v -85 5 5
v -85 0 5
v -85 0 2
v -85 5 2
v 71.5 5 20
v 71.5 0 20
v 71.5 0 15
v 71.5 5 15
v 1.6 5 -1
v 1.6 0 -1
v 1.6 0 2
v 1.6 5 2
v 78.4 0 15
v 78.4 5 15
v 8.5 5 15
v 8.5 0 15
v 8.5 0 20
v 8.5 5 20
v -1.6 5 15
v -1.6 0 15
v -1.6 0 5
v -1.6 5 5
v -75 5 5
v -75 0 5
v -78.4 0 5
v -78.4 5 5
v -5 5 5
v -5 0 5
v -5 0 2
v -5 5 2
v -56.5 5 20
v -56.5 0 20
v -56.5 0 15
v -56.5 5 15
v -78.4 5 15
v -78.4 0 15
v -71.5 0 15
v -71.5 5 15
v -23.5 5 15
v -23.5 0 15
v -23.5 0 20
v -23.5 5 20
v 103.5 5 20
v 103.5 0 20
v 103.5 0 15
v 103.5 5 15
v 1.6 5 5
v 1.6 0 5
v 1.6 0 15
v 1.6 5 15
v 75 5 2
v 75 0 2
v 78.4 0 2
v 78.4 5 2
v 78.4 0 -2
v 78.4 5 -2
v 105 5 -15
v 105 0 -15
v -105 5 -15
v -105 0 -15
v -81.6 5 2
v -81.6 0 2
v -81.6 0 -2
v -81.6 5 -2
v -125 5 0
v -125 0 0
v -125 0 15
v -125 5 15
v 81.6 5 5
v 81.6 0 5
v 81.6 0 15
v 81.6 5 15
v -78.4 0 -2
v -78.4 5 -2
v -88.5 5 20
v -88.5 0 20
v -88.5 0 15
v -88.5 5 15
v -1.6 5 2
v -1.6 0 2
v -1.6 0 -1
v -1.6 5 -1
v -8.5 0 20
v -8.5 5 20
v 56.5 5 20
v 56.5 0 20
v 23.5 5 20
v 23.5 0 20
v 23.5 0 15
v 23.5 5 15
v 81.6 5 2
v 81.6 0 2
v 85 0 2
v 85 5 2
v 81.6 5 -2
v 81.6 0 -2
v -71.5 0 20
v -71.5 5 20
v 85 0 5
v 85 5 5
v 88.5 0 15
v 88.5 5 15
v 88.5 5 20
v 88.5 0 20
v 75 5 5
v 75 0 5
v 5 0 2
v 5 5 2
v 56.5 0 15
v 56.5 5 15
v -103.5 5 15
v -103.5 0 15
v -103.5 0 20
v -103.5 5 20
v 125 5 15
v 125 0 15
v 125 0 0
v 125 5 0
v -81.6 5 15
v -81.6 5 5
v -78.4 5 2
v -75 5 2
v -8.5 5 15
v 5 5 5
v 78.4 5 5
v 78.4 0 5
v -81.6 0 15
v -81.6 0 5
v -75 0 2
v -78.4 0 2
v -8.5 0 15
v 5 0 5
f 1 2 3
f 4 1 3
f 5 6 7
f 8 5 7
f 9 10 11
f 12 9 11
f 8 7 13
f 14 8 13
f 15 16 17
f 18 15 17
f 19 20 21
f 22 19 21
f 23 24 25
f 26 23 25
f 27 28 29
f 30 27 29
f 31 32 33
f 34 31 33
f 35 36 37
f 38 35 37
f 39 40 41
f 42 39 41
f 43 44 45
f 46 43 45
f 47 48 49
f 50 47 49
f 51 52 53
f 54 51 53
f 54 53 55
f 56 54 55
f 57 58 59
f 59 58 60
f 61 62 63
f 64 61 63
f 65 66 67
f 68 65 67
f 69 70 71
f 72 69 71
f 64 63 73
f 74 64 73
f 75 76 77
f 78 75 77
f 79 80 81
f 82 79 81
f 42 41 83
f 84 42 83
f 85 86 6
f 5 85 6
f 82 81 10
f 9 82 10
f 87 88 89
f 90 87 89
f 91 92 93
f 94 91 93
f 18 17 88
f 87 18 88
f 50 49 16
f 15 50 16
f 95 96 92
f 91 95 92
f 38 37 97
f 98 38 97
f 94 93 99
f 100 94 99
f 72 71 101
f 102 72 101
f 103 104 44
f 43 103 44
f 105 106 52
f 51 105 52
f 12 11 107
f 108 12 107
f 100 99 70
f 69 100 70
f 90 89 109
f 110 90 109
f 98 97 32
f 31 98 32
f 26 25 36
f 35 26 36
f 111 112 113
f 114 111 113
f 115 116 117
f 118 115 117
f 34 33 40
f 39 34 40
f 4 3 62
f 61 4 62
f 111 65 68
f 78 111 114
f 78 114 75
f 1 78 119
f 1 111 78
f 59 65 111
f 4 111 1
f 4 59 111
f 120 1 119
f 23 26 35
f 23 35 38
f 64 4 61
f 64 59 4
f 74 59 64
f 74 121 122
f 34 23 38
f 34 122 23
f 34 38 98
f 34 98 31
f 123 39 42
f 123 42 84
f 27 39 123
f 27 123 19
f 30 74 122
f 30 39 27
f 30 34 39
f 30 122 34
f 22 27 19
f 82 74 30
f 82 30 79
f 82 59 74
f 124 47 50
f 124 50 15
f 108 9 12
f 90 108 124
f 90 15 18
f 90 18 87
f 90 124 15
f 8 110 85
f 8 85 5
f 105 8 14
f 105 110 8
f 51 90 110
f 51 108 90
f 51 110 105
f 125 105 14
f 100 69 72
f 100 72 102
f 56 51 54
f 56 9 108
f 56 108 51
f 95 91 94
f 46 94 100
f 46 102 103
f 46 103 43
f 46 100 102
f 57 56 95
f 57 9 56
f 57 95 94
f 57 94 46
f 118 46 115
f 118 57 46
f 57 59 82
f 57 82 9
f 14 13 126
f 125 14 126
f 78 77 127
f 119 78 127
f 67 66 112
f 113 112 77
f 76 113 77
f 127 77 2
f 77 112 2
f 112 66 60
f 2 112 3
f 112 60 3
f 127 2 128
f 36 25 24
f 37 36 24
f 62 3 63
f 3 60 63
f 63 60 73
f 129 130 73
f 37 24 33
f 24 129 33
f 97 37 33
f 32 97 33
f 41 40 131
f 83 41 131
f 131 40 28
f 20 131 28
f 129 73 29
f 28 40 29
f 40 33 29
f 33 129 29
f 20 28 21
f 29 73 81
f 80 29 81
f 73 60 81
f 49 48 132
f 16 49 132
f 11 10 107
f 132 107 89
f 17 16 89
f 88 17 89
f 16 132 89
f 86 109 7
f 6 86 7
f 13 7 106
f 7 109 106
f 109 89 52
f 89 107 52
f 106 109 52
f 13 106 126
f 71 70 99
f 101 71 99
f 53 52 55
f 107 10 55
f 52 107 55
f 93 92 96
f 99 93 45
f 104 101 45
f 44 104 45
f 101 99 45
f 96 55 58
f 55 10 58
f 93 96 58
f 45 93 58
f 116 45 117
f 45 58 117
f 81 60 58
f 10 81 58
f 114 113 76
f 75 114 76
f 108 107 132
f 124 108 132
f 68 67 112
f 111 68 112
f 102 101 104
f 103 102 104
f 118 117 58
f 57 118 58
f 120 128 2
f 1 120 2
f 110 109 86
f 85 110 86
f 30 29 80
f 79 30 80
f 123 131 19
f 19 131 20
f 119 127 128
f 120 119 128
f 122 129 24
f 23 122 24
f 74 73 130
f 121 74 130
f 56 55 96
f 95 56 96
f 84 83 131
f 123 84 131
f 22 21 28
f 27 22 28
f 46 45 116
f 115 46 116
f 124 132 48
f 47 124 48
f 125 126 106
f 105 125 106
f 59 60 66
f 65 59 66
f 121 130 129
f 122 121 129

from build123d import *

# Parameters (mm, degrees)
EXTRUDE_1_DEPTH = 5


with BuildPart() as part:
    # 草圖1 → 填料-伸長1 (new body)
    with BuildSketch(Plane(origin=(0, 0, 0), x_dir=(1, 0, 0), z_dir=(0, 1, 0))):
        Polygon((-125, -15), (-103.5, -15), (-103.5, -20), (-88.5, -20), (-88.5, -15), (-81.6, -15), (-81.6, -5), (-85, -5), (-85, -2), (-81.6, -2), (-81.6, 2), (-78.4, 2), (-78.4, -2), (-75, -2), (-75, -5), (-78.4, -5), (-78.4, -15), (-71.5, -15), (-71.5, -20), (-56.5, -20), (-56.5, -15), (-23.5, -15), (-23.5, -20), (-8.5, -20), (-8.5, -15), (-1.6, -15), (-1.6, -5), (-5, -5), (-5, -2), (-1.6, -2), (-1.6, 1), (1.6, 1), (1.6, -2), (5, -2), (5, -5), (1.6, -5), (1.6, -15), (8.5, -15), (8.5, -20), (23.5, -20), (23.5, -15), (56.5, -15), (56.5, -20), (71.5, -20), (71.5, -15), (78.4, -15), (78.4, -5), (75, -5), (75, -2), (78.4, -2), (78.4, 2), (81.6, 2), (81.6, -2), (85, -2), (85, -5), (81.6, -5), (81.6, -15), (88.5, -15), (88.5, -20), (103.5, -20), (103.5, -15), (125, -15), (125, 0), (105, 15), (-105, 15), (-125, 0), align=None)
    extrude(amount=EXTRUDE_1_DEPTH)


solid = part.part
